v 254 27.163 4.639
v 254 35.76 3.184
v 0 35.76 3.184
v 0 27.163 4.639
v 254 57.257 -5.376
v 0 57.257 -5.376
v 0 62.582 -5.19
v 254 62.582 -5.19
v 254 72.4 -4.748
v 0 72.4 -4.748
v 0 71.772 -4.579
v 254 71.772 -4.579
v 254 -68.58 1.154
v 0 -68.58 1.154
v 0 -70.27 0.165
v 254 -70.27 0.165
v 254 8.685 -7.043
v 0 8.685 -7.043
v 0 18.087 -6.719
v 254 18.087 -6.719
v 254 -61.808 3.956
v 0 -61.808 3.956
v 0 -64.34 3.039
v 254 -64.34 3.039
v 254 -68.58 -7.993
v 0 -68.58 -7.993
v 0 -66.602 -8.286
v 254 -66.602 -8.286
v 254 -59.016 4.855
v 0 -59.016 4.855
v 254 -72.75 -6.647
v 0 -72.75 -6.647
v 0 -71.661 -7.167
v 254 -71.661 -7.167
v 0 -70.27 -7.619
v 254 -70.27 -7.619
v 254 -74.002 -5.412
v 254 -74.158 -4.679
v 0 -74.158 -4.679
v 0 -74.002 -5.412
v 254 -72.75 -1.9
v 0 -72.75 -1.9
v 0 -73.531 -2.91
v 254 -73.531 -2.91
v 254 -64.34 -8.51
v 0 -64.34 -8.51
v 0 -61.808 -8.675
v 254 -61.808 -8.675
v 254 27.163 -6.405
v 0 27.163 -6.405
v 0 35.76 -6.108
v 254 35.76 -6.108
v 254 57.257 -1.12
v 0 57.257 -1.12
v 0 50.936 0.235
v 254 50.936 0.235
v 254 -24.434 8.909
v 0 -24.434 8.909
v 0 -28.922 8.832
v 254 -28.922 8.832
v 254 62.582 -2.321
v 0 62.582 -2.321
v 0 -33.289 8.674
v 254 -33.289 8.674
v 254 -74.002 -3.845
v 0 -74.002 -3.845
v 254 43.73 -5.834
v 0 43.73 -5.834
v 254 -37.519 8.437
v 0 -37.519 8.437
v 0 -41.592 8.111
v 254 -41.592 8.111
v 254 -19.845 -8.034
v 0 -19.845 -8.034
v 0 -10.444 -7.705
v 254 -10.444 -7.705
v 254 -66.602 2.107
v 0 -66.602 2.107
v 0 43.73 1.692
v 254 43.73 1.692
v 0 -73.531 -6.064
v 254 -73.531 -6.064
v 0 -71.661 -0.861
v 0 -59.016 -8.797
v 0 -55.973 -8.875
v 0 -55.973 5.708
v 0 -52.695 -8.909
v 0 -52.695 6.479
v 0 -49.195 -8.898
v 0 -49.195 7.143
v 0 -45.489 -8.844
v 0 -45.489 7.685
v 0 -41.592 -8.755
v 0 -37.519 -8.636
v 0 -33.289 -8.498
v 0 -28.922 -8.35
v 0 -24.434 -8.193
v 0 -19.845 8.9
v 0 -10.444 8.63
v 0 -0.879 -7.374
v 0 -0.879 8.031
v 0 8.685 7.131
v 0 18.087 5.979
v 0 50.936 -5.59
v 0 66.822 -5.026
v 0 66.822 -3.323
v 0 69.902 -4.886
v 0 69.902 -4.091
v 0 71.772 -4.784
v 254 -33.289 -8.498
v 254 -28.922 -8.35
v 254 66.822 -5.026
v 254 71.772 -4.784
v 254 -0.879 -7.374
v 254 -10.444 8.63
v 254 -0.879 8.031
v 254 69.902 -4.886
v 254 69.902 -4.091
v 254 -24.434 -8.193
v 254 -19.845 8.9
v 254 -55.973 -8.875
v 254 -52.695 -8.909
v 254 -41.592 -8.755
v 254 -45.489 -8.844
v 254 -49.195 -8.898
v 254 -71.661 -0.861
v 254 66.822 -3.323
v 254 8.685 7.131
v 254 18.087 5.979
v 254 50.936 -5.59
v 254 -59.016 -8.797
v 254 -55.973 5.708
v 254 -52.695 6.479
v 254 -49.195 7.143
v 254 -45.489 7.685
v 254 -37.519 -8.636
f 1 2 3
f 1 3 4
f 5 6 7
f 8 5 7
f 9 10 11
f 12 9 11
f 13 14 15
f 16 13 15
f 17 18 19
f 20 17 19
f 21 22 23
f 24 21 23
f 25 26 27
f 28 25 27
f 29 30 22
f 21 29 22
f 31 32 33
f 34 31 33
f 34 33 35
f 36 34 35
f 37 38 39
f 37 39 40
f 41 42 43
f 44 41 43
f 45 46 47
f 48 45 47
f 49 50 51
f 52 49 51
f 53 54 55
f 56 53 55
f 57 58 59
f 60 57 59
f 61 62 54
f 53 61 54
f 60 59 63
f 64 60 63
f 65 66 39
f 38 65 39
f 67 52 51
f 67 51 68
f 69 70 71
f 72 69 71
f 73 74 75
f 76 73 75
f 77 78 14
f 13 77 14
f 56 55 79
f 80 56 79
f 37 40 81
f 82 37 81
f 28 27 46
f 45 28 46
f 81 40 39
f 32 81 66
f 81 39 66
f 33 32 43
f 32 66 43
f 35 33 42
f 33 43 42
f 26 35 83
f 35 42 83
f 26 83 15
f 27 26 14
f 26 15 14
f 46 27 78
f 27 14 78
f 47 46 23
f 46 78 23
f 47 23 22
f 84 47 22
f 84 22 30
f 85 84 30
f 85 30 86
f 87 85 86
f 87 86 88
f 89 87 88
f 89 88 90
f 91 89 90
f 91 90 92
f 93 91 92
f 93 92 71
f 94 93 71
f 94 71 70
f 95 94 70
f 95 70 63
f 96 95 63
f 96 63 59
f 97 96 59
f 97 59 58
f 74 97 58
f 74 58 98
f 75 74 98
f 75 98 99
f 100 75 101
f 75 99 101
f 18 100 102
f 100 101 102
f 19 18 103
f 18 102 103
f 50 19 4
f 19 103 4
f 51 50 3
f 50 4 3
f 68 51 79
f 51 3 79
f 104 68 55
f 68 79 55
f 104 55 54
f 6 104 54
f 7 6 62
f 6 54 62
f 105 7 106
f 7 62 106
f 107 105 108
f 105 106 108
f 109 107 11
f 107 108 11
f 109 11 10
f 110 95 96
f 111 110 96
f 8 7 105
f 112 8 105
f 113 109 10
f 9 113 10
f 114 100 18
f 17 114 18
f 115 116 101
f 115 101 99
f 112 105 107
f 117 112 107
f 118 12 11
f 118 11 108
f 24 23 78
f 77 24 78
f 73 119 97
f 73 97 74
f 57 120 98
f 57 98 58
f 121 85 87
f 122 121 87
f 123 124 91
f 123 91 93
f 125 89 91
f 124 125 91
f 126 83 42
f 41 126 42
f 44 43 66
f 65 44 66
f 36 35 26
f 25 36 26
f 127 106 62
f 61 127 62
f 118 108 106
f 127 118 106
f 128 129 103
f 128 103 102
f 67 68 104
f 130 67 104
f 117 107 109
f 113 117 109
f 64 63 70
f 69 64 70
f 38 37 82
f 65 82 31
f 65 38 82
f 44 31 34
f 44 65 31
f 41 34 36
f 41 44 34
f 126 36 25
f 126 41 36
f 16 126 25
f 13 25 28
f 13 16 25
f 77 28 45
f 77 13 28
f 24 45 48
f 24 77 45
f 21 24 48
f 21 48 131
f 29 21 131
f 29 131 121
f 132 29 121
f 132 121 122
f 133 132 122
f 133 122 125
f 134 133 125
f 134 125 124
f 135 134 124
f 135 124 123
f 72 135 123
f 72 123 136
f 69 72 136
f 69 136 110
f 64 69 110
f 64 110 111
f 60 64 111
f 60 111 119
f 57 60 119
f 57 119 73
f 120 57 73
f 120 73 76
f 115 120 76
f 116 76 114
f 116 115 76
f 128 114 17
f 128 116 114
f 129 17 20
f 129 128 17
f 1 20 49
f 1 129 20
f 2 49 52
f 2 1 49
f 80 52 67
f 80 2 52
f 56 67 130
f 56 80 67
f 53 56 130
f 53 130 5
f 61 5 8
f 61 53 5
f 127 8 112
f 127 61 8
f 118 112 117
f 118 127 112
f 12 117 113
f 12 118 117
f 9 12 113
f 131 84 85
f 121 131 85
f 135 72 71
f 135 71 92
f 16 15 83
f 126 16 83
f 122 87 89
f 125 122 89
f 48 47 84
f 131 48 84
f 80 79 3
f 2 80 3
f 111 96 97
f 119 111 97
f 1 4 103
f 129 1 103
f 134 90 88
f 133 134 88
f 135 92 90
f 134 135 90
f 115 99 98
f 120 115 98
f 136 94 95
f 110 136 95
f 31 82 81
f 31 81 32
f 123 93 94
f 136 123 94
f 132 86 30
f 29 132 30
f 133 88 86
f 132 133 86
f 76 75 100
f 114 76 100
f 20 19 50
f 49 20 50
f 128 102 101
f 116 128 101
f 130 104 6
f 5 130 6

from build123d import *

# Parameters (mm, degrees)
F1_DEPTH = 254


with BuildPart() as f1:
    # F0 (on Right) → F1 (new body)
    with BuildSketch(Plane.YZ):
        Polygon((72.399652, -4.747743), (71.772374, -4.579188), (69.902299, -4.091153), (66.821634, -3.323184), (62.581714, -2.320747), (57.257264, -1.120419), (50.93622, 0.235229), (43.729961, 1.692021), (35.760152, 3.183992), (27.163039, 4.63931), (18.086705, 5.978855), (8.685022, 7.130796), (-0.879348, 8.030667), (-10.443743, 8.630082), (-19.845426, 8.899754), (-24.434165, 8.908542), (-28.921761, 8.832317), (-33.289189, 8.674049), (-37.518848, 8.43661), (-41.591713, 8.111261), (-45.488682, 7.68477), (-49.195126, 7.142505), (-52.694942, 6.4786), (-55.973447, 5.70771), (-59.015986, 4.854753), (-61.807928, 3.956355), (-64.340435, 3.038881), (-66.601823, 2.106778), (-68.580356, 1.154151), (-70.270167, 0.164897), (-71.66102, -0.861009), (-72.749943, -1.900123), (-73.531095, -2.9099), (-74.001554, -3.84495), (-74.158348, -4.678858), (-74.001554, -5.411648), (-73.531095, -6.063818), (-72.749943, -6.647129), (-71.66102, -7.167397), (-70.270167, -7.618806), (-68.580356, -7.992542), (-66.601823, -8.285658), (-64.340435, -8.509889), (-61.807928, -8.675497), (-59.015986, -8.797138), (-55.973447, -8.874811), (-52.694942, -8.908517), (-49.195126, -8.898255), (-45.488682, -8.844026), (-41.591713, -8.754643), (-37.518848, -8.635924), (-33.289189, -8.498154), (-28.921761, -8.350123), (-24.434165, -8.193303), (-19.845426, -8.033563), (-10.443743, -7.705268), (-0.879348, -7.374052), (8.685022, -7.042836), (18.086705, -6.718935), (27.163039, -6.405296), (35.760152, -6.107786), (43.729961, -5.83372), (50.93622, -5.590438), (57.257264, -5.376469), (62.581714, -5.190338), (66.821634, -5.026203), (69.902299, -4.885512), (71.772374, -4.784369), align=None)
    extrude(amount=F1_DEPTH)


solid = f1.part
